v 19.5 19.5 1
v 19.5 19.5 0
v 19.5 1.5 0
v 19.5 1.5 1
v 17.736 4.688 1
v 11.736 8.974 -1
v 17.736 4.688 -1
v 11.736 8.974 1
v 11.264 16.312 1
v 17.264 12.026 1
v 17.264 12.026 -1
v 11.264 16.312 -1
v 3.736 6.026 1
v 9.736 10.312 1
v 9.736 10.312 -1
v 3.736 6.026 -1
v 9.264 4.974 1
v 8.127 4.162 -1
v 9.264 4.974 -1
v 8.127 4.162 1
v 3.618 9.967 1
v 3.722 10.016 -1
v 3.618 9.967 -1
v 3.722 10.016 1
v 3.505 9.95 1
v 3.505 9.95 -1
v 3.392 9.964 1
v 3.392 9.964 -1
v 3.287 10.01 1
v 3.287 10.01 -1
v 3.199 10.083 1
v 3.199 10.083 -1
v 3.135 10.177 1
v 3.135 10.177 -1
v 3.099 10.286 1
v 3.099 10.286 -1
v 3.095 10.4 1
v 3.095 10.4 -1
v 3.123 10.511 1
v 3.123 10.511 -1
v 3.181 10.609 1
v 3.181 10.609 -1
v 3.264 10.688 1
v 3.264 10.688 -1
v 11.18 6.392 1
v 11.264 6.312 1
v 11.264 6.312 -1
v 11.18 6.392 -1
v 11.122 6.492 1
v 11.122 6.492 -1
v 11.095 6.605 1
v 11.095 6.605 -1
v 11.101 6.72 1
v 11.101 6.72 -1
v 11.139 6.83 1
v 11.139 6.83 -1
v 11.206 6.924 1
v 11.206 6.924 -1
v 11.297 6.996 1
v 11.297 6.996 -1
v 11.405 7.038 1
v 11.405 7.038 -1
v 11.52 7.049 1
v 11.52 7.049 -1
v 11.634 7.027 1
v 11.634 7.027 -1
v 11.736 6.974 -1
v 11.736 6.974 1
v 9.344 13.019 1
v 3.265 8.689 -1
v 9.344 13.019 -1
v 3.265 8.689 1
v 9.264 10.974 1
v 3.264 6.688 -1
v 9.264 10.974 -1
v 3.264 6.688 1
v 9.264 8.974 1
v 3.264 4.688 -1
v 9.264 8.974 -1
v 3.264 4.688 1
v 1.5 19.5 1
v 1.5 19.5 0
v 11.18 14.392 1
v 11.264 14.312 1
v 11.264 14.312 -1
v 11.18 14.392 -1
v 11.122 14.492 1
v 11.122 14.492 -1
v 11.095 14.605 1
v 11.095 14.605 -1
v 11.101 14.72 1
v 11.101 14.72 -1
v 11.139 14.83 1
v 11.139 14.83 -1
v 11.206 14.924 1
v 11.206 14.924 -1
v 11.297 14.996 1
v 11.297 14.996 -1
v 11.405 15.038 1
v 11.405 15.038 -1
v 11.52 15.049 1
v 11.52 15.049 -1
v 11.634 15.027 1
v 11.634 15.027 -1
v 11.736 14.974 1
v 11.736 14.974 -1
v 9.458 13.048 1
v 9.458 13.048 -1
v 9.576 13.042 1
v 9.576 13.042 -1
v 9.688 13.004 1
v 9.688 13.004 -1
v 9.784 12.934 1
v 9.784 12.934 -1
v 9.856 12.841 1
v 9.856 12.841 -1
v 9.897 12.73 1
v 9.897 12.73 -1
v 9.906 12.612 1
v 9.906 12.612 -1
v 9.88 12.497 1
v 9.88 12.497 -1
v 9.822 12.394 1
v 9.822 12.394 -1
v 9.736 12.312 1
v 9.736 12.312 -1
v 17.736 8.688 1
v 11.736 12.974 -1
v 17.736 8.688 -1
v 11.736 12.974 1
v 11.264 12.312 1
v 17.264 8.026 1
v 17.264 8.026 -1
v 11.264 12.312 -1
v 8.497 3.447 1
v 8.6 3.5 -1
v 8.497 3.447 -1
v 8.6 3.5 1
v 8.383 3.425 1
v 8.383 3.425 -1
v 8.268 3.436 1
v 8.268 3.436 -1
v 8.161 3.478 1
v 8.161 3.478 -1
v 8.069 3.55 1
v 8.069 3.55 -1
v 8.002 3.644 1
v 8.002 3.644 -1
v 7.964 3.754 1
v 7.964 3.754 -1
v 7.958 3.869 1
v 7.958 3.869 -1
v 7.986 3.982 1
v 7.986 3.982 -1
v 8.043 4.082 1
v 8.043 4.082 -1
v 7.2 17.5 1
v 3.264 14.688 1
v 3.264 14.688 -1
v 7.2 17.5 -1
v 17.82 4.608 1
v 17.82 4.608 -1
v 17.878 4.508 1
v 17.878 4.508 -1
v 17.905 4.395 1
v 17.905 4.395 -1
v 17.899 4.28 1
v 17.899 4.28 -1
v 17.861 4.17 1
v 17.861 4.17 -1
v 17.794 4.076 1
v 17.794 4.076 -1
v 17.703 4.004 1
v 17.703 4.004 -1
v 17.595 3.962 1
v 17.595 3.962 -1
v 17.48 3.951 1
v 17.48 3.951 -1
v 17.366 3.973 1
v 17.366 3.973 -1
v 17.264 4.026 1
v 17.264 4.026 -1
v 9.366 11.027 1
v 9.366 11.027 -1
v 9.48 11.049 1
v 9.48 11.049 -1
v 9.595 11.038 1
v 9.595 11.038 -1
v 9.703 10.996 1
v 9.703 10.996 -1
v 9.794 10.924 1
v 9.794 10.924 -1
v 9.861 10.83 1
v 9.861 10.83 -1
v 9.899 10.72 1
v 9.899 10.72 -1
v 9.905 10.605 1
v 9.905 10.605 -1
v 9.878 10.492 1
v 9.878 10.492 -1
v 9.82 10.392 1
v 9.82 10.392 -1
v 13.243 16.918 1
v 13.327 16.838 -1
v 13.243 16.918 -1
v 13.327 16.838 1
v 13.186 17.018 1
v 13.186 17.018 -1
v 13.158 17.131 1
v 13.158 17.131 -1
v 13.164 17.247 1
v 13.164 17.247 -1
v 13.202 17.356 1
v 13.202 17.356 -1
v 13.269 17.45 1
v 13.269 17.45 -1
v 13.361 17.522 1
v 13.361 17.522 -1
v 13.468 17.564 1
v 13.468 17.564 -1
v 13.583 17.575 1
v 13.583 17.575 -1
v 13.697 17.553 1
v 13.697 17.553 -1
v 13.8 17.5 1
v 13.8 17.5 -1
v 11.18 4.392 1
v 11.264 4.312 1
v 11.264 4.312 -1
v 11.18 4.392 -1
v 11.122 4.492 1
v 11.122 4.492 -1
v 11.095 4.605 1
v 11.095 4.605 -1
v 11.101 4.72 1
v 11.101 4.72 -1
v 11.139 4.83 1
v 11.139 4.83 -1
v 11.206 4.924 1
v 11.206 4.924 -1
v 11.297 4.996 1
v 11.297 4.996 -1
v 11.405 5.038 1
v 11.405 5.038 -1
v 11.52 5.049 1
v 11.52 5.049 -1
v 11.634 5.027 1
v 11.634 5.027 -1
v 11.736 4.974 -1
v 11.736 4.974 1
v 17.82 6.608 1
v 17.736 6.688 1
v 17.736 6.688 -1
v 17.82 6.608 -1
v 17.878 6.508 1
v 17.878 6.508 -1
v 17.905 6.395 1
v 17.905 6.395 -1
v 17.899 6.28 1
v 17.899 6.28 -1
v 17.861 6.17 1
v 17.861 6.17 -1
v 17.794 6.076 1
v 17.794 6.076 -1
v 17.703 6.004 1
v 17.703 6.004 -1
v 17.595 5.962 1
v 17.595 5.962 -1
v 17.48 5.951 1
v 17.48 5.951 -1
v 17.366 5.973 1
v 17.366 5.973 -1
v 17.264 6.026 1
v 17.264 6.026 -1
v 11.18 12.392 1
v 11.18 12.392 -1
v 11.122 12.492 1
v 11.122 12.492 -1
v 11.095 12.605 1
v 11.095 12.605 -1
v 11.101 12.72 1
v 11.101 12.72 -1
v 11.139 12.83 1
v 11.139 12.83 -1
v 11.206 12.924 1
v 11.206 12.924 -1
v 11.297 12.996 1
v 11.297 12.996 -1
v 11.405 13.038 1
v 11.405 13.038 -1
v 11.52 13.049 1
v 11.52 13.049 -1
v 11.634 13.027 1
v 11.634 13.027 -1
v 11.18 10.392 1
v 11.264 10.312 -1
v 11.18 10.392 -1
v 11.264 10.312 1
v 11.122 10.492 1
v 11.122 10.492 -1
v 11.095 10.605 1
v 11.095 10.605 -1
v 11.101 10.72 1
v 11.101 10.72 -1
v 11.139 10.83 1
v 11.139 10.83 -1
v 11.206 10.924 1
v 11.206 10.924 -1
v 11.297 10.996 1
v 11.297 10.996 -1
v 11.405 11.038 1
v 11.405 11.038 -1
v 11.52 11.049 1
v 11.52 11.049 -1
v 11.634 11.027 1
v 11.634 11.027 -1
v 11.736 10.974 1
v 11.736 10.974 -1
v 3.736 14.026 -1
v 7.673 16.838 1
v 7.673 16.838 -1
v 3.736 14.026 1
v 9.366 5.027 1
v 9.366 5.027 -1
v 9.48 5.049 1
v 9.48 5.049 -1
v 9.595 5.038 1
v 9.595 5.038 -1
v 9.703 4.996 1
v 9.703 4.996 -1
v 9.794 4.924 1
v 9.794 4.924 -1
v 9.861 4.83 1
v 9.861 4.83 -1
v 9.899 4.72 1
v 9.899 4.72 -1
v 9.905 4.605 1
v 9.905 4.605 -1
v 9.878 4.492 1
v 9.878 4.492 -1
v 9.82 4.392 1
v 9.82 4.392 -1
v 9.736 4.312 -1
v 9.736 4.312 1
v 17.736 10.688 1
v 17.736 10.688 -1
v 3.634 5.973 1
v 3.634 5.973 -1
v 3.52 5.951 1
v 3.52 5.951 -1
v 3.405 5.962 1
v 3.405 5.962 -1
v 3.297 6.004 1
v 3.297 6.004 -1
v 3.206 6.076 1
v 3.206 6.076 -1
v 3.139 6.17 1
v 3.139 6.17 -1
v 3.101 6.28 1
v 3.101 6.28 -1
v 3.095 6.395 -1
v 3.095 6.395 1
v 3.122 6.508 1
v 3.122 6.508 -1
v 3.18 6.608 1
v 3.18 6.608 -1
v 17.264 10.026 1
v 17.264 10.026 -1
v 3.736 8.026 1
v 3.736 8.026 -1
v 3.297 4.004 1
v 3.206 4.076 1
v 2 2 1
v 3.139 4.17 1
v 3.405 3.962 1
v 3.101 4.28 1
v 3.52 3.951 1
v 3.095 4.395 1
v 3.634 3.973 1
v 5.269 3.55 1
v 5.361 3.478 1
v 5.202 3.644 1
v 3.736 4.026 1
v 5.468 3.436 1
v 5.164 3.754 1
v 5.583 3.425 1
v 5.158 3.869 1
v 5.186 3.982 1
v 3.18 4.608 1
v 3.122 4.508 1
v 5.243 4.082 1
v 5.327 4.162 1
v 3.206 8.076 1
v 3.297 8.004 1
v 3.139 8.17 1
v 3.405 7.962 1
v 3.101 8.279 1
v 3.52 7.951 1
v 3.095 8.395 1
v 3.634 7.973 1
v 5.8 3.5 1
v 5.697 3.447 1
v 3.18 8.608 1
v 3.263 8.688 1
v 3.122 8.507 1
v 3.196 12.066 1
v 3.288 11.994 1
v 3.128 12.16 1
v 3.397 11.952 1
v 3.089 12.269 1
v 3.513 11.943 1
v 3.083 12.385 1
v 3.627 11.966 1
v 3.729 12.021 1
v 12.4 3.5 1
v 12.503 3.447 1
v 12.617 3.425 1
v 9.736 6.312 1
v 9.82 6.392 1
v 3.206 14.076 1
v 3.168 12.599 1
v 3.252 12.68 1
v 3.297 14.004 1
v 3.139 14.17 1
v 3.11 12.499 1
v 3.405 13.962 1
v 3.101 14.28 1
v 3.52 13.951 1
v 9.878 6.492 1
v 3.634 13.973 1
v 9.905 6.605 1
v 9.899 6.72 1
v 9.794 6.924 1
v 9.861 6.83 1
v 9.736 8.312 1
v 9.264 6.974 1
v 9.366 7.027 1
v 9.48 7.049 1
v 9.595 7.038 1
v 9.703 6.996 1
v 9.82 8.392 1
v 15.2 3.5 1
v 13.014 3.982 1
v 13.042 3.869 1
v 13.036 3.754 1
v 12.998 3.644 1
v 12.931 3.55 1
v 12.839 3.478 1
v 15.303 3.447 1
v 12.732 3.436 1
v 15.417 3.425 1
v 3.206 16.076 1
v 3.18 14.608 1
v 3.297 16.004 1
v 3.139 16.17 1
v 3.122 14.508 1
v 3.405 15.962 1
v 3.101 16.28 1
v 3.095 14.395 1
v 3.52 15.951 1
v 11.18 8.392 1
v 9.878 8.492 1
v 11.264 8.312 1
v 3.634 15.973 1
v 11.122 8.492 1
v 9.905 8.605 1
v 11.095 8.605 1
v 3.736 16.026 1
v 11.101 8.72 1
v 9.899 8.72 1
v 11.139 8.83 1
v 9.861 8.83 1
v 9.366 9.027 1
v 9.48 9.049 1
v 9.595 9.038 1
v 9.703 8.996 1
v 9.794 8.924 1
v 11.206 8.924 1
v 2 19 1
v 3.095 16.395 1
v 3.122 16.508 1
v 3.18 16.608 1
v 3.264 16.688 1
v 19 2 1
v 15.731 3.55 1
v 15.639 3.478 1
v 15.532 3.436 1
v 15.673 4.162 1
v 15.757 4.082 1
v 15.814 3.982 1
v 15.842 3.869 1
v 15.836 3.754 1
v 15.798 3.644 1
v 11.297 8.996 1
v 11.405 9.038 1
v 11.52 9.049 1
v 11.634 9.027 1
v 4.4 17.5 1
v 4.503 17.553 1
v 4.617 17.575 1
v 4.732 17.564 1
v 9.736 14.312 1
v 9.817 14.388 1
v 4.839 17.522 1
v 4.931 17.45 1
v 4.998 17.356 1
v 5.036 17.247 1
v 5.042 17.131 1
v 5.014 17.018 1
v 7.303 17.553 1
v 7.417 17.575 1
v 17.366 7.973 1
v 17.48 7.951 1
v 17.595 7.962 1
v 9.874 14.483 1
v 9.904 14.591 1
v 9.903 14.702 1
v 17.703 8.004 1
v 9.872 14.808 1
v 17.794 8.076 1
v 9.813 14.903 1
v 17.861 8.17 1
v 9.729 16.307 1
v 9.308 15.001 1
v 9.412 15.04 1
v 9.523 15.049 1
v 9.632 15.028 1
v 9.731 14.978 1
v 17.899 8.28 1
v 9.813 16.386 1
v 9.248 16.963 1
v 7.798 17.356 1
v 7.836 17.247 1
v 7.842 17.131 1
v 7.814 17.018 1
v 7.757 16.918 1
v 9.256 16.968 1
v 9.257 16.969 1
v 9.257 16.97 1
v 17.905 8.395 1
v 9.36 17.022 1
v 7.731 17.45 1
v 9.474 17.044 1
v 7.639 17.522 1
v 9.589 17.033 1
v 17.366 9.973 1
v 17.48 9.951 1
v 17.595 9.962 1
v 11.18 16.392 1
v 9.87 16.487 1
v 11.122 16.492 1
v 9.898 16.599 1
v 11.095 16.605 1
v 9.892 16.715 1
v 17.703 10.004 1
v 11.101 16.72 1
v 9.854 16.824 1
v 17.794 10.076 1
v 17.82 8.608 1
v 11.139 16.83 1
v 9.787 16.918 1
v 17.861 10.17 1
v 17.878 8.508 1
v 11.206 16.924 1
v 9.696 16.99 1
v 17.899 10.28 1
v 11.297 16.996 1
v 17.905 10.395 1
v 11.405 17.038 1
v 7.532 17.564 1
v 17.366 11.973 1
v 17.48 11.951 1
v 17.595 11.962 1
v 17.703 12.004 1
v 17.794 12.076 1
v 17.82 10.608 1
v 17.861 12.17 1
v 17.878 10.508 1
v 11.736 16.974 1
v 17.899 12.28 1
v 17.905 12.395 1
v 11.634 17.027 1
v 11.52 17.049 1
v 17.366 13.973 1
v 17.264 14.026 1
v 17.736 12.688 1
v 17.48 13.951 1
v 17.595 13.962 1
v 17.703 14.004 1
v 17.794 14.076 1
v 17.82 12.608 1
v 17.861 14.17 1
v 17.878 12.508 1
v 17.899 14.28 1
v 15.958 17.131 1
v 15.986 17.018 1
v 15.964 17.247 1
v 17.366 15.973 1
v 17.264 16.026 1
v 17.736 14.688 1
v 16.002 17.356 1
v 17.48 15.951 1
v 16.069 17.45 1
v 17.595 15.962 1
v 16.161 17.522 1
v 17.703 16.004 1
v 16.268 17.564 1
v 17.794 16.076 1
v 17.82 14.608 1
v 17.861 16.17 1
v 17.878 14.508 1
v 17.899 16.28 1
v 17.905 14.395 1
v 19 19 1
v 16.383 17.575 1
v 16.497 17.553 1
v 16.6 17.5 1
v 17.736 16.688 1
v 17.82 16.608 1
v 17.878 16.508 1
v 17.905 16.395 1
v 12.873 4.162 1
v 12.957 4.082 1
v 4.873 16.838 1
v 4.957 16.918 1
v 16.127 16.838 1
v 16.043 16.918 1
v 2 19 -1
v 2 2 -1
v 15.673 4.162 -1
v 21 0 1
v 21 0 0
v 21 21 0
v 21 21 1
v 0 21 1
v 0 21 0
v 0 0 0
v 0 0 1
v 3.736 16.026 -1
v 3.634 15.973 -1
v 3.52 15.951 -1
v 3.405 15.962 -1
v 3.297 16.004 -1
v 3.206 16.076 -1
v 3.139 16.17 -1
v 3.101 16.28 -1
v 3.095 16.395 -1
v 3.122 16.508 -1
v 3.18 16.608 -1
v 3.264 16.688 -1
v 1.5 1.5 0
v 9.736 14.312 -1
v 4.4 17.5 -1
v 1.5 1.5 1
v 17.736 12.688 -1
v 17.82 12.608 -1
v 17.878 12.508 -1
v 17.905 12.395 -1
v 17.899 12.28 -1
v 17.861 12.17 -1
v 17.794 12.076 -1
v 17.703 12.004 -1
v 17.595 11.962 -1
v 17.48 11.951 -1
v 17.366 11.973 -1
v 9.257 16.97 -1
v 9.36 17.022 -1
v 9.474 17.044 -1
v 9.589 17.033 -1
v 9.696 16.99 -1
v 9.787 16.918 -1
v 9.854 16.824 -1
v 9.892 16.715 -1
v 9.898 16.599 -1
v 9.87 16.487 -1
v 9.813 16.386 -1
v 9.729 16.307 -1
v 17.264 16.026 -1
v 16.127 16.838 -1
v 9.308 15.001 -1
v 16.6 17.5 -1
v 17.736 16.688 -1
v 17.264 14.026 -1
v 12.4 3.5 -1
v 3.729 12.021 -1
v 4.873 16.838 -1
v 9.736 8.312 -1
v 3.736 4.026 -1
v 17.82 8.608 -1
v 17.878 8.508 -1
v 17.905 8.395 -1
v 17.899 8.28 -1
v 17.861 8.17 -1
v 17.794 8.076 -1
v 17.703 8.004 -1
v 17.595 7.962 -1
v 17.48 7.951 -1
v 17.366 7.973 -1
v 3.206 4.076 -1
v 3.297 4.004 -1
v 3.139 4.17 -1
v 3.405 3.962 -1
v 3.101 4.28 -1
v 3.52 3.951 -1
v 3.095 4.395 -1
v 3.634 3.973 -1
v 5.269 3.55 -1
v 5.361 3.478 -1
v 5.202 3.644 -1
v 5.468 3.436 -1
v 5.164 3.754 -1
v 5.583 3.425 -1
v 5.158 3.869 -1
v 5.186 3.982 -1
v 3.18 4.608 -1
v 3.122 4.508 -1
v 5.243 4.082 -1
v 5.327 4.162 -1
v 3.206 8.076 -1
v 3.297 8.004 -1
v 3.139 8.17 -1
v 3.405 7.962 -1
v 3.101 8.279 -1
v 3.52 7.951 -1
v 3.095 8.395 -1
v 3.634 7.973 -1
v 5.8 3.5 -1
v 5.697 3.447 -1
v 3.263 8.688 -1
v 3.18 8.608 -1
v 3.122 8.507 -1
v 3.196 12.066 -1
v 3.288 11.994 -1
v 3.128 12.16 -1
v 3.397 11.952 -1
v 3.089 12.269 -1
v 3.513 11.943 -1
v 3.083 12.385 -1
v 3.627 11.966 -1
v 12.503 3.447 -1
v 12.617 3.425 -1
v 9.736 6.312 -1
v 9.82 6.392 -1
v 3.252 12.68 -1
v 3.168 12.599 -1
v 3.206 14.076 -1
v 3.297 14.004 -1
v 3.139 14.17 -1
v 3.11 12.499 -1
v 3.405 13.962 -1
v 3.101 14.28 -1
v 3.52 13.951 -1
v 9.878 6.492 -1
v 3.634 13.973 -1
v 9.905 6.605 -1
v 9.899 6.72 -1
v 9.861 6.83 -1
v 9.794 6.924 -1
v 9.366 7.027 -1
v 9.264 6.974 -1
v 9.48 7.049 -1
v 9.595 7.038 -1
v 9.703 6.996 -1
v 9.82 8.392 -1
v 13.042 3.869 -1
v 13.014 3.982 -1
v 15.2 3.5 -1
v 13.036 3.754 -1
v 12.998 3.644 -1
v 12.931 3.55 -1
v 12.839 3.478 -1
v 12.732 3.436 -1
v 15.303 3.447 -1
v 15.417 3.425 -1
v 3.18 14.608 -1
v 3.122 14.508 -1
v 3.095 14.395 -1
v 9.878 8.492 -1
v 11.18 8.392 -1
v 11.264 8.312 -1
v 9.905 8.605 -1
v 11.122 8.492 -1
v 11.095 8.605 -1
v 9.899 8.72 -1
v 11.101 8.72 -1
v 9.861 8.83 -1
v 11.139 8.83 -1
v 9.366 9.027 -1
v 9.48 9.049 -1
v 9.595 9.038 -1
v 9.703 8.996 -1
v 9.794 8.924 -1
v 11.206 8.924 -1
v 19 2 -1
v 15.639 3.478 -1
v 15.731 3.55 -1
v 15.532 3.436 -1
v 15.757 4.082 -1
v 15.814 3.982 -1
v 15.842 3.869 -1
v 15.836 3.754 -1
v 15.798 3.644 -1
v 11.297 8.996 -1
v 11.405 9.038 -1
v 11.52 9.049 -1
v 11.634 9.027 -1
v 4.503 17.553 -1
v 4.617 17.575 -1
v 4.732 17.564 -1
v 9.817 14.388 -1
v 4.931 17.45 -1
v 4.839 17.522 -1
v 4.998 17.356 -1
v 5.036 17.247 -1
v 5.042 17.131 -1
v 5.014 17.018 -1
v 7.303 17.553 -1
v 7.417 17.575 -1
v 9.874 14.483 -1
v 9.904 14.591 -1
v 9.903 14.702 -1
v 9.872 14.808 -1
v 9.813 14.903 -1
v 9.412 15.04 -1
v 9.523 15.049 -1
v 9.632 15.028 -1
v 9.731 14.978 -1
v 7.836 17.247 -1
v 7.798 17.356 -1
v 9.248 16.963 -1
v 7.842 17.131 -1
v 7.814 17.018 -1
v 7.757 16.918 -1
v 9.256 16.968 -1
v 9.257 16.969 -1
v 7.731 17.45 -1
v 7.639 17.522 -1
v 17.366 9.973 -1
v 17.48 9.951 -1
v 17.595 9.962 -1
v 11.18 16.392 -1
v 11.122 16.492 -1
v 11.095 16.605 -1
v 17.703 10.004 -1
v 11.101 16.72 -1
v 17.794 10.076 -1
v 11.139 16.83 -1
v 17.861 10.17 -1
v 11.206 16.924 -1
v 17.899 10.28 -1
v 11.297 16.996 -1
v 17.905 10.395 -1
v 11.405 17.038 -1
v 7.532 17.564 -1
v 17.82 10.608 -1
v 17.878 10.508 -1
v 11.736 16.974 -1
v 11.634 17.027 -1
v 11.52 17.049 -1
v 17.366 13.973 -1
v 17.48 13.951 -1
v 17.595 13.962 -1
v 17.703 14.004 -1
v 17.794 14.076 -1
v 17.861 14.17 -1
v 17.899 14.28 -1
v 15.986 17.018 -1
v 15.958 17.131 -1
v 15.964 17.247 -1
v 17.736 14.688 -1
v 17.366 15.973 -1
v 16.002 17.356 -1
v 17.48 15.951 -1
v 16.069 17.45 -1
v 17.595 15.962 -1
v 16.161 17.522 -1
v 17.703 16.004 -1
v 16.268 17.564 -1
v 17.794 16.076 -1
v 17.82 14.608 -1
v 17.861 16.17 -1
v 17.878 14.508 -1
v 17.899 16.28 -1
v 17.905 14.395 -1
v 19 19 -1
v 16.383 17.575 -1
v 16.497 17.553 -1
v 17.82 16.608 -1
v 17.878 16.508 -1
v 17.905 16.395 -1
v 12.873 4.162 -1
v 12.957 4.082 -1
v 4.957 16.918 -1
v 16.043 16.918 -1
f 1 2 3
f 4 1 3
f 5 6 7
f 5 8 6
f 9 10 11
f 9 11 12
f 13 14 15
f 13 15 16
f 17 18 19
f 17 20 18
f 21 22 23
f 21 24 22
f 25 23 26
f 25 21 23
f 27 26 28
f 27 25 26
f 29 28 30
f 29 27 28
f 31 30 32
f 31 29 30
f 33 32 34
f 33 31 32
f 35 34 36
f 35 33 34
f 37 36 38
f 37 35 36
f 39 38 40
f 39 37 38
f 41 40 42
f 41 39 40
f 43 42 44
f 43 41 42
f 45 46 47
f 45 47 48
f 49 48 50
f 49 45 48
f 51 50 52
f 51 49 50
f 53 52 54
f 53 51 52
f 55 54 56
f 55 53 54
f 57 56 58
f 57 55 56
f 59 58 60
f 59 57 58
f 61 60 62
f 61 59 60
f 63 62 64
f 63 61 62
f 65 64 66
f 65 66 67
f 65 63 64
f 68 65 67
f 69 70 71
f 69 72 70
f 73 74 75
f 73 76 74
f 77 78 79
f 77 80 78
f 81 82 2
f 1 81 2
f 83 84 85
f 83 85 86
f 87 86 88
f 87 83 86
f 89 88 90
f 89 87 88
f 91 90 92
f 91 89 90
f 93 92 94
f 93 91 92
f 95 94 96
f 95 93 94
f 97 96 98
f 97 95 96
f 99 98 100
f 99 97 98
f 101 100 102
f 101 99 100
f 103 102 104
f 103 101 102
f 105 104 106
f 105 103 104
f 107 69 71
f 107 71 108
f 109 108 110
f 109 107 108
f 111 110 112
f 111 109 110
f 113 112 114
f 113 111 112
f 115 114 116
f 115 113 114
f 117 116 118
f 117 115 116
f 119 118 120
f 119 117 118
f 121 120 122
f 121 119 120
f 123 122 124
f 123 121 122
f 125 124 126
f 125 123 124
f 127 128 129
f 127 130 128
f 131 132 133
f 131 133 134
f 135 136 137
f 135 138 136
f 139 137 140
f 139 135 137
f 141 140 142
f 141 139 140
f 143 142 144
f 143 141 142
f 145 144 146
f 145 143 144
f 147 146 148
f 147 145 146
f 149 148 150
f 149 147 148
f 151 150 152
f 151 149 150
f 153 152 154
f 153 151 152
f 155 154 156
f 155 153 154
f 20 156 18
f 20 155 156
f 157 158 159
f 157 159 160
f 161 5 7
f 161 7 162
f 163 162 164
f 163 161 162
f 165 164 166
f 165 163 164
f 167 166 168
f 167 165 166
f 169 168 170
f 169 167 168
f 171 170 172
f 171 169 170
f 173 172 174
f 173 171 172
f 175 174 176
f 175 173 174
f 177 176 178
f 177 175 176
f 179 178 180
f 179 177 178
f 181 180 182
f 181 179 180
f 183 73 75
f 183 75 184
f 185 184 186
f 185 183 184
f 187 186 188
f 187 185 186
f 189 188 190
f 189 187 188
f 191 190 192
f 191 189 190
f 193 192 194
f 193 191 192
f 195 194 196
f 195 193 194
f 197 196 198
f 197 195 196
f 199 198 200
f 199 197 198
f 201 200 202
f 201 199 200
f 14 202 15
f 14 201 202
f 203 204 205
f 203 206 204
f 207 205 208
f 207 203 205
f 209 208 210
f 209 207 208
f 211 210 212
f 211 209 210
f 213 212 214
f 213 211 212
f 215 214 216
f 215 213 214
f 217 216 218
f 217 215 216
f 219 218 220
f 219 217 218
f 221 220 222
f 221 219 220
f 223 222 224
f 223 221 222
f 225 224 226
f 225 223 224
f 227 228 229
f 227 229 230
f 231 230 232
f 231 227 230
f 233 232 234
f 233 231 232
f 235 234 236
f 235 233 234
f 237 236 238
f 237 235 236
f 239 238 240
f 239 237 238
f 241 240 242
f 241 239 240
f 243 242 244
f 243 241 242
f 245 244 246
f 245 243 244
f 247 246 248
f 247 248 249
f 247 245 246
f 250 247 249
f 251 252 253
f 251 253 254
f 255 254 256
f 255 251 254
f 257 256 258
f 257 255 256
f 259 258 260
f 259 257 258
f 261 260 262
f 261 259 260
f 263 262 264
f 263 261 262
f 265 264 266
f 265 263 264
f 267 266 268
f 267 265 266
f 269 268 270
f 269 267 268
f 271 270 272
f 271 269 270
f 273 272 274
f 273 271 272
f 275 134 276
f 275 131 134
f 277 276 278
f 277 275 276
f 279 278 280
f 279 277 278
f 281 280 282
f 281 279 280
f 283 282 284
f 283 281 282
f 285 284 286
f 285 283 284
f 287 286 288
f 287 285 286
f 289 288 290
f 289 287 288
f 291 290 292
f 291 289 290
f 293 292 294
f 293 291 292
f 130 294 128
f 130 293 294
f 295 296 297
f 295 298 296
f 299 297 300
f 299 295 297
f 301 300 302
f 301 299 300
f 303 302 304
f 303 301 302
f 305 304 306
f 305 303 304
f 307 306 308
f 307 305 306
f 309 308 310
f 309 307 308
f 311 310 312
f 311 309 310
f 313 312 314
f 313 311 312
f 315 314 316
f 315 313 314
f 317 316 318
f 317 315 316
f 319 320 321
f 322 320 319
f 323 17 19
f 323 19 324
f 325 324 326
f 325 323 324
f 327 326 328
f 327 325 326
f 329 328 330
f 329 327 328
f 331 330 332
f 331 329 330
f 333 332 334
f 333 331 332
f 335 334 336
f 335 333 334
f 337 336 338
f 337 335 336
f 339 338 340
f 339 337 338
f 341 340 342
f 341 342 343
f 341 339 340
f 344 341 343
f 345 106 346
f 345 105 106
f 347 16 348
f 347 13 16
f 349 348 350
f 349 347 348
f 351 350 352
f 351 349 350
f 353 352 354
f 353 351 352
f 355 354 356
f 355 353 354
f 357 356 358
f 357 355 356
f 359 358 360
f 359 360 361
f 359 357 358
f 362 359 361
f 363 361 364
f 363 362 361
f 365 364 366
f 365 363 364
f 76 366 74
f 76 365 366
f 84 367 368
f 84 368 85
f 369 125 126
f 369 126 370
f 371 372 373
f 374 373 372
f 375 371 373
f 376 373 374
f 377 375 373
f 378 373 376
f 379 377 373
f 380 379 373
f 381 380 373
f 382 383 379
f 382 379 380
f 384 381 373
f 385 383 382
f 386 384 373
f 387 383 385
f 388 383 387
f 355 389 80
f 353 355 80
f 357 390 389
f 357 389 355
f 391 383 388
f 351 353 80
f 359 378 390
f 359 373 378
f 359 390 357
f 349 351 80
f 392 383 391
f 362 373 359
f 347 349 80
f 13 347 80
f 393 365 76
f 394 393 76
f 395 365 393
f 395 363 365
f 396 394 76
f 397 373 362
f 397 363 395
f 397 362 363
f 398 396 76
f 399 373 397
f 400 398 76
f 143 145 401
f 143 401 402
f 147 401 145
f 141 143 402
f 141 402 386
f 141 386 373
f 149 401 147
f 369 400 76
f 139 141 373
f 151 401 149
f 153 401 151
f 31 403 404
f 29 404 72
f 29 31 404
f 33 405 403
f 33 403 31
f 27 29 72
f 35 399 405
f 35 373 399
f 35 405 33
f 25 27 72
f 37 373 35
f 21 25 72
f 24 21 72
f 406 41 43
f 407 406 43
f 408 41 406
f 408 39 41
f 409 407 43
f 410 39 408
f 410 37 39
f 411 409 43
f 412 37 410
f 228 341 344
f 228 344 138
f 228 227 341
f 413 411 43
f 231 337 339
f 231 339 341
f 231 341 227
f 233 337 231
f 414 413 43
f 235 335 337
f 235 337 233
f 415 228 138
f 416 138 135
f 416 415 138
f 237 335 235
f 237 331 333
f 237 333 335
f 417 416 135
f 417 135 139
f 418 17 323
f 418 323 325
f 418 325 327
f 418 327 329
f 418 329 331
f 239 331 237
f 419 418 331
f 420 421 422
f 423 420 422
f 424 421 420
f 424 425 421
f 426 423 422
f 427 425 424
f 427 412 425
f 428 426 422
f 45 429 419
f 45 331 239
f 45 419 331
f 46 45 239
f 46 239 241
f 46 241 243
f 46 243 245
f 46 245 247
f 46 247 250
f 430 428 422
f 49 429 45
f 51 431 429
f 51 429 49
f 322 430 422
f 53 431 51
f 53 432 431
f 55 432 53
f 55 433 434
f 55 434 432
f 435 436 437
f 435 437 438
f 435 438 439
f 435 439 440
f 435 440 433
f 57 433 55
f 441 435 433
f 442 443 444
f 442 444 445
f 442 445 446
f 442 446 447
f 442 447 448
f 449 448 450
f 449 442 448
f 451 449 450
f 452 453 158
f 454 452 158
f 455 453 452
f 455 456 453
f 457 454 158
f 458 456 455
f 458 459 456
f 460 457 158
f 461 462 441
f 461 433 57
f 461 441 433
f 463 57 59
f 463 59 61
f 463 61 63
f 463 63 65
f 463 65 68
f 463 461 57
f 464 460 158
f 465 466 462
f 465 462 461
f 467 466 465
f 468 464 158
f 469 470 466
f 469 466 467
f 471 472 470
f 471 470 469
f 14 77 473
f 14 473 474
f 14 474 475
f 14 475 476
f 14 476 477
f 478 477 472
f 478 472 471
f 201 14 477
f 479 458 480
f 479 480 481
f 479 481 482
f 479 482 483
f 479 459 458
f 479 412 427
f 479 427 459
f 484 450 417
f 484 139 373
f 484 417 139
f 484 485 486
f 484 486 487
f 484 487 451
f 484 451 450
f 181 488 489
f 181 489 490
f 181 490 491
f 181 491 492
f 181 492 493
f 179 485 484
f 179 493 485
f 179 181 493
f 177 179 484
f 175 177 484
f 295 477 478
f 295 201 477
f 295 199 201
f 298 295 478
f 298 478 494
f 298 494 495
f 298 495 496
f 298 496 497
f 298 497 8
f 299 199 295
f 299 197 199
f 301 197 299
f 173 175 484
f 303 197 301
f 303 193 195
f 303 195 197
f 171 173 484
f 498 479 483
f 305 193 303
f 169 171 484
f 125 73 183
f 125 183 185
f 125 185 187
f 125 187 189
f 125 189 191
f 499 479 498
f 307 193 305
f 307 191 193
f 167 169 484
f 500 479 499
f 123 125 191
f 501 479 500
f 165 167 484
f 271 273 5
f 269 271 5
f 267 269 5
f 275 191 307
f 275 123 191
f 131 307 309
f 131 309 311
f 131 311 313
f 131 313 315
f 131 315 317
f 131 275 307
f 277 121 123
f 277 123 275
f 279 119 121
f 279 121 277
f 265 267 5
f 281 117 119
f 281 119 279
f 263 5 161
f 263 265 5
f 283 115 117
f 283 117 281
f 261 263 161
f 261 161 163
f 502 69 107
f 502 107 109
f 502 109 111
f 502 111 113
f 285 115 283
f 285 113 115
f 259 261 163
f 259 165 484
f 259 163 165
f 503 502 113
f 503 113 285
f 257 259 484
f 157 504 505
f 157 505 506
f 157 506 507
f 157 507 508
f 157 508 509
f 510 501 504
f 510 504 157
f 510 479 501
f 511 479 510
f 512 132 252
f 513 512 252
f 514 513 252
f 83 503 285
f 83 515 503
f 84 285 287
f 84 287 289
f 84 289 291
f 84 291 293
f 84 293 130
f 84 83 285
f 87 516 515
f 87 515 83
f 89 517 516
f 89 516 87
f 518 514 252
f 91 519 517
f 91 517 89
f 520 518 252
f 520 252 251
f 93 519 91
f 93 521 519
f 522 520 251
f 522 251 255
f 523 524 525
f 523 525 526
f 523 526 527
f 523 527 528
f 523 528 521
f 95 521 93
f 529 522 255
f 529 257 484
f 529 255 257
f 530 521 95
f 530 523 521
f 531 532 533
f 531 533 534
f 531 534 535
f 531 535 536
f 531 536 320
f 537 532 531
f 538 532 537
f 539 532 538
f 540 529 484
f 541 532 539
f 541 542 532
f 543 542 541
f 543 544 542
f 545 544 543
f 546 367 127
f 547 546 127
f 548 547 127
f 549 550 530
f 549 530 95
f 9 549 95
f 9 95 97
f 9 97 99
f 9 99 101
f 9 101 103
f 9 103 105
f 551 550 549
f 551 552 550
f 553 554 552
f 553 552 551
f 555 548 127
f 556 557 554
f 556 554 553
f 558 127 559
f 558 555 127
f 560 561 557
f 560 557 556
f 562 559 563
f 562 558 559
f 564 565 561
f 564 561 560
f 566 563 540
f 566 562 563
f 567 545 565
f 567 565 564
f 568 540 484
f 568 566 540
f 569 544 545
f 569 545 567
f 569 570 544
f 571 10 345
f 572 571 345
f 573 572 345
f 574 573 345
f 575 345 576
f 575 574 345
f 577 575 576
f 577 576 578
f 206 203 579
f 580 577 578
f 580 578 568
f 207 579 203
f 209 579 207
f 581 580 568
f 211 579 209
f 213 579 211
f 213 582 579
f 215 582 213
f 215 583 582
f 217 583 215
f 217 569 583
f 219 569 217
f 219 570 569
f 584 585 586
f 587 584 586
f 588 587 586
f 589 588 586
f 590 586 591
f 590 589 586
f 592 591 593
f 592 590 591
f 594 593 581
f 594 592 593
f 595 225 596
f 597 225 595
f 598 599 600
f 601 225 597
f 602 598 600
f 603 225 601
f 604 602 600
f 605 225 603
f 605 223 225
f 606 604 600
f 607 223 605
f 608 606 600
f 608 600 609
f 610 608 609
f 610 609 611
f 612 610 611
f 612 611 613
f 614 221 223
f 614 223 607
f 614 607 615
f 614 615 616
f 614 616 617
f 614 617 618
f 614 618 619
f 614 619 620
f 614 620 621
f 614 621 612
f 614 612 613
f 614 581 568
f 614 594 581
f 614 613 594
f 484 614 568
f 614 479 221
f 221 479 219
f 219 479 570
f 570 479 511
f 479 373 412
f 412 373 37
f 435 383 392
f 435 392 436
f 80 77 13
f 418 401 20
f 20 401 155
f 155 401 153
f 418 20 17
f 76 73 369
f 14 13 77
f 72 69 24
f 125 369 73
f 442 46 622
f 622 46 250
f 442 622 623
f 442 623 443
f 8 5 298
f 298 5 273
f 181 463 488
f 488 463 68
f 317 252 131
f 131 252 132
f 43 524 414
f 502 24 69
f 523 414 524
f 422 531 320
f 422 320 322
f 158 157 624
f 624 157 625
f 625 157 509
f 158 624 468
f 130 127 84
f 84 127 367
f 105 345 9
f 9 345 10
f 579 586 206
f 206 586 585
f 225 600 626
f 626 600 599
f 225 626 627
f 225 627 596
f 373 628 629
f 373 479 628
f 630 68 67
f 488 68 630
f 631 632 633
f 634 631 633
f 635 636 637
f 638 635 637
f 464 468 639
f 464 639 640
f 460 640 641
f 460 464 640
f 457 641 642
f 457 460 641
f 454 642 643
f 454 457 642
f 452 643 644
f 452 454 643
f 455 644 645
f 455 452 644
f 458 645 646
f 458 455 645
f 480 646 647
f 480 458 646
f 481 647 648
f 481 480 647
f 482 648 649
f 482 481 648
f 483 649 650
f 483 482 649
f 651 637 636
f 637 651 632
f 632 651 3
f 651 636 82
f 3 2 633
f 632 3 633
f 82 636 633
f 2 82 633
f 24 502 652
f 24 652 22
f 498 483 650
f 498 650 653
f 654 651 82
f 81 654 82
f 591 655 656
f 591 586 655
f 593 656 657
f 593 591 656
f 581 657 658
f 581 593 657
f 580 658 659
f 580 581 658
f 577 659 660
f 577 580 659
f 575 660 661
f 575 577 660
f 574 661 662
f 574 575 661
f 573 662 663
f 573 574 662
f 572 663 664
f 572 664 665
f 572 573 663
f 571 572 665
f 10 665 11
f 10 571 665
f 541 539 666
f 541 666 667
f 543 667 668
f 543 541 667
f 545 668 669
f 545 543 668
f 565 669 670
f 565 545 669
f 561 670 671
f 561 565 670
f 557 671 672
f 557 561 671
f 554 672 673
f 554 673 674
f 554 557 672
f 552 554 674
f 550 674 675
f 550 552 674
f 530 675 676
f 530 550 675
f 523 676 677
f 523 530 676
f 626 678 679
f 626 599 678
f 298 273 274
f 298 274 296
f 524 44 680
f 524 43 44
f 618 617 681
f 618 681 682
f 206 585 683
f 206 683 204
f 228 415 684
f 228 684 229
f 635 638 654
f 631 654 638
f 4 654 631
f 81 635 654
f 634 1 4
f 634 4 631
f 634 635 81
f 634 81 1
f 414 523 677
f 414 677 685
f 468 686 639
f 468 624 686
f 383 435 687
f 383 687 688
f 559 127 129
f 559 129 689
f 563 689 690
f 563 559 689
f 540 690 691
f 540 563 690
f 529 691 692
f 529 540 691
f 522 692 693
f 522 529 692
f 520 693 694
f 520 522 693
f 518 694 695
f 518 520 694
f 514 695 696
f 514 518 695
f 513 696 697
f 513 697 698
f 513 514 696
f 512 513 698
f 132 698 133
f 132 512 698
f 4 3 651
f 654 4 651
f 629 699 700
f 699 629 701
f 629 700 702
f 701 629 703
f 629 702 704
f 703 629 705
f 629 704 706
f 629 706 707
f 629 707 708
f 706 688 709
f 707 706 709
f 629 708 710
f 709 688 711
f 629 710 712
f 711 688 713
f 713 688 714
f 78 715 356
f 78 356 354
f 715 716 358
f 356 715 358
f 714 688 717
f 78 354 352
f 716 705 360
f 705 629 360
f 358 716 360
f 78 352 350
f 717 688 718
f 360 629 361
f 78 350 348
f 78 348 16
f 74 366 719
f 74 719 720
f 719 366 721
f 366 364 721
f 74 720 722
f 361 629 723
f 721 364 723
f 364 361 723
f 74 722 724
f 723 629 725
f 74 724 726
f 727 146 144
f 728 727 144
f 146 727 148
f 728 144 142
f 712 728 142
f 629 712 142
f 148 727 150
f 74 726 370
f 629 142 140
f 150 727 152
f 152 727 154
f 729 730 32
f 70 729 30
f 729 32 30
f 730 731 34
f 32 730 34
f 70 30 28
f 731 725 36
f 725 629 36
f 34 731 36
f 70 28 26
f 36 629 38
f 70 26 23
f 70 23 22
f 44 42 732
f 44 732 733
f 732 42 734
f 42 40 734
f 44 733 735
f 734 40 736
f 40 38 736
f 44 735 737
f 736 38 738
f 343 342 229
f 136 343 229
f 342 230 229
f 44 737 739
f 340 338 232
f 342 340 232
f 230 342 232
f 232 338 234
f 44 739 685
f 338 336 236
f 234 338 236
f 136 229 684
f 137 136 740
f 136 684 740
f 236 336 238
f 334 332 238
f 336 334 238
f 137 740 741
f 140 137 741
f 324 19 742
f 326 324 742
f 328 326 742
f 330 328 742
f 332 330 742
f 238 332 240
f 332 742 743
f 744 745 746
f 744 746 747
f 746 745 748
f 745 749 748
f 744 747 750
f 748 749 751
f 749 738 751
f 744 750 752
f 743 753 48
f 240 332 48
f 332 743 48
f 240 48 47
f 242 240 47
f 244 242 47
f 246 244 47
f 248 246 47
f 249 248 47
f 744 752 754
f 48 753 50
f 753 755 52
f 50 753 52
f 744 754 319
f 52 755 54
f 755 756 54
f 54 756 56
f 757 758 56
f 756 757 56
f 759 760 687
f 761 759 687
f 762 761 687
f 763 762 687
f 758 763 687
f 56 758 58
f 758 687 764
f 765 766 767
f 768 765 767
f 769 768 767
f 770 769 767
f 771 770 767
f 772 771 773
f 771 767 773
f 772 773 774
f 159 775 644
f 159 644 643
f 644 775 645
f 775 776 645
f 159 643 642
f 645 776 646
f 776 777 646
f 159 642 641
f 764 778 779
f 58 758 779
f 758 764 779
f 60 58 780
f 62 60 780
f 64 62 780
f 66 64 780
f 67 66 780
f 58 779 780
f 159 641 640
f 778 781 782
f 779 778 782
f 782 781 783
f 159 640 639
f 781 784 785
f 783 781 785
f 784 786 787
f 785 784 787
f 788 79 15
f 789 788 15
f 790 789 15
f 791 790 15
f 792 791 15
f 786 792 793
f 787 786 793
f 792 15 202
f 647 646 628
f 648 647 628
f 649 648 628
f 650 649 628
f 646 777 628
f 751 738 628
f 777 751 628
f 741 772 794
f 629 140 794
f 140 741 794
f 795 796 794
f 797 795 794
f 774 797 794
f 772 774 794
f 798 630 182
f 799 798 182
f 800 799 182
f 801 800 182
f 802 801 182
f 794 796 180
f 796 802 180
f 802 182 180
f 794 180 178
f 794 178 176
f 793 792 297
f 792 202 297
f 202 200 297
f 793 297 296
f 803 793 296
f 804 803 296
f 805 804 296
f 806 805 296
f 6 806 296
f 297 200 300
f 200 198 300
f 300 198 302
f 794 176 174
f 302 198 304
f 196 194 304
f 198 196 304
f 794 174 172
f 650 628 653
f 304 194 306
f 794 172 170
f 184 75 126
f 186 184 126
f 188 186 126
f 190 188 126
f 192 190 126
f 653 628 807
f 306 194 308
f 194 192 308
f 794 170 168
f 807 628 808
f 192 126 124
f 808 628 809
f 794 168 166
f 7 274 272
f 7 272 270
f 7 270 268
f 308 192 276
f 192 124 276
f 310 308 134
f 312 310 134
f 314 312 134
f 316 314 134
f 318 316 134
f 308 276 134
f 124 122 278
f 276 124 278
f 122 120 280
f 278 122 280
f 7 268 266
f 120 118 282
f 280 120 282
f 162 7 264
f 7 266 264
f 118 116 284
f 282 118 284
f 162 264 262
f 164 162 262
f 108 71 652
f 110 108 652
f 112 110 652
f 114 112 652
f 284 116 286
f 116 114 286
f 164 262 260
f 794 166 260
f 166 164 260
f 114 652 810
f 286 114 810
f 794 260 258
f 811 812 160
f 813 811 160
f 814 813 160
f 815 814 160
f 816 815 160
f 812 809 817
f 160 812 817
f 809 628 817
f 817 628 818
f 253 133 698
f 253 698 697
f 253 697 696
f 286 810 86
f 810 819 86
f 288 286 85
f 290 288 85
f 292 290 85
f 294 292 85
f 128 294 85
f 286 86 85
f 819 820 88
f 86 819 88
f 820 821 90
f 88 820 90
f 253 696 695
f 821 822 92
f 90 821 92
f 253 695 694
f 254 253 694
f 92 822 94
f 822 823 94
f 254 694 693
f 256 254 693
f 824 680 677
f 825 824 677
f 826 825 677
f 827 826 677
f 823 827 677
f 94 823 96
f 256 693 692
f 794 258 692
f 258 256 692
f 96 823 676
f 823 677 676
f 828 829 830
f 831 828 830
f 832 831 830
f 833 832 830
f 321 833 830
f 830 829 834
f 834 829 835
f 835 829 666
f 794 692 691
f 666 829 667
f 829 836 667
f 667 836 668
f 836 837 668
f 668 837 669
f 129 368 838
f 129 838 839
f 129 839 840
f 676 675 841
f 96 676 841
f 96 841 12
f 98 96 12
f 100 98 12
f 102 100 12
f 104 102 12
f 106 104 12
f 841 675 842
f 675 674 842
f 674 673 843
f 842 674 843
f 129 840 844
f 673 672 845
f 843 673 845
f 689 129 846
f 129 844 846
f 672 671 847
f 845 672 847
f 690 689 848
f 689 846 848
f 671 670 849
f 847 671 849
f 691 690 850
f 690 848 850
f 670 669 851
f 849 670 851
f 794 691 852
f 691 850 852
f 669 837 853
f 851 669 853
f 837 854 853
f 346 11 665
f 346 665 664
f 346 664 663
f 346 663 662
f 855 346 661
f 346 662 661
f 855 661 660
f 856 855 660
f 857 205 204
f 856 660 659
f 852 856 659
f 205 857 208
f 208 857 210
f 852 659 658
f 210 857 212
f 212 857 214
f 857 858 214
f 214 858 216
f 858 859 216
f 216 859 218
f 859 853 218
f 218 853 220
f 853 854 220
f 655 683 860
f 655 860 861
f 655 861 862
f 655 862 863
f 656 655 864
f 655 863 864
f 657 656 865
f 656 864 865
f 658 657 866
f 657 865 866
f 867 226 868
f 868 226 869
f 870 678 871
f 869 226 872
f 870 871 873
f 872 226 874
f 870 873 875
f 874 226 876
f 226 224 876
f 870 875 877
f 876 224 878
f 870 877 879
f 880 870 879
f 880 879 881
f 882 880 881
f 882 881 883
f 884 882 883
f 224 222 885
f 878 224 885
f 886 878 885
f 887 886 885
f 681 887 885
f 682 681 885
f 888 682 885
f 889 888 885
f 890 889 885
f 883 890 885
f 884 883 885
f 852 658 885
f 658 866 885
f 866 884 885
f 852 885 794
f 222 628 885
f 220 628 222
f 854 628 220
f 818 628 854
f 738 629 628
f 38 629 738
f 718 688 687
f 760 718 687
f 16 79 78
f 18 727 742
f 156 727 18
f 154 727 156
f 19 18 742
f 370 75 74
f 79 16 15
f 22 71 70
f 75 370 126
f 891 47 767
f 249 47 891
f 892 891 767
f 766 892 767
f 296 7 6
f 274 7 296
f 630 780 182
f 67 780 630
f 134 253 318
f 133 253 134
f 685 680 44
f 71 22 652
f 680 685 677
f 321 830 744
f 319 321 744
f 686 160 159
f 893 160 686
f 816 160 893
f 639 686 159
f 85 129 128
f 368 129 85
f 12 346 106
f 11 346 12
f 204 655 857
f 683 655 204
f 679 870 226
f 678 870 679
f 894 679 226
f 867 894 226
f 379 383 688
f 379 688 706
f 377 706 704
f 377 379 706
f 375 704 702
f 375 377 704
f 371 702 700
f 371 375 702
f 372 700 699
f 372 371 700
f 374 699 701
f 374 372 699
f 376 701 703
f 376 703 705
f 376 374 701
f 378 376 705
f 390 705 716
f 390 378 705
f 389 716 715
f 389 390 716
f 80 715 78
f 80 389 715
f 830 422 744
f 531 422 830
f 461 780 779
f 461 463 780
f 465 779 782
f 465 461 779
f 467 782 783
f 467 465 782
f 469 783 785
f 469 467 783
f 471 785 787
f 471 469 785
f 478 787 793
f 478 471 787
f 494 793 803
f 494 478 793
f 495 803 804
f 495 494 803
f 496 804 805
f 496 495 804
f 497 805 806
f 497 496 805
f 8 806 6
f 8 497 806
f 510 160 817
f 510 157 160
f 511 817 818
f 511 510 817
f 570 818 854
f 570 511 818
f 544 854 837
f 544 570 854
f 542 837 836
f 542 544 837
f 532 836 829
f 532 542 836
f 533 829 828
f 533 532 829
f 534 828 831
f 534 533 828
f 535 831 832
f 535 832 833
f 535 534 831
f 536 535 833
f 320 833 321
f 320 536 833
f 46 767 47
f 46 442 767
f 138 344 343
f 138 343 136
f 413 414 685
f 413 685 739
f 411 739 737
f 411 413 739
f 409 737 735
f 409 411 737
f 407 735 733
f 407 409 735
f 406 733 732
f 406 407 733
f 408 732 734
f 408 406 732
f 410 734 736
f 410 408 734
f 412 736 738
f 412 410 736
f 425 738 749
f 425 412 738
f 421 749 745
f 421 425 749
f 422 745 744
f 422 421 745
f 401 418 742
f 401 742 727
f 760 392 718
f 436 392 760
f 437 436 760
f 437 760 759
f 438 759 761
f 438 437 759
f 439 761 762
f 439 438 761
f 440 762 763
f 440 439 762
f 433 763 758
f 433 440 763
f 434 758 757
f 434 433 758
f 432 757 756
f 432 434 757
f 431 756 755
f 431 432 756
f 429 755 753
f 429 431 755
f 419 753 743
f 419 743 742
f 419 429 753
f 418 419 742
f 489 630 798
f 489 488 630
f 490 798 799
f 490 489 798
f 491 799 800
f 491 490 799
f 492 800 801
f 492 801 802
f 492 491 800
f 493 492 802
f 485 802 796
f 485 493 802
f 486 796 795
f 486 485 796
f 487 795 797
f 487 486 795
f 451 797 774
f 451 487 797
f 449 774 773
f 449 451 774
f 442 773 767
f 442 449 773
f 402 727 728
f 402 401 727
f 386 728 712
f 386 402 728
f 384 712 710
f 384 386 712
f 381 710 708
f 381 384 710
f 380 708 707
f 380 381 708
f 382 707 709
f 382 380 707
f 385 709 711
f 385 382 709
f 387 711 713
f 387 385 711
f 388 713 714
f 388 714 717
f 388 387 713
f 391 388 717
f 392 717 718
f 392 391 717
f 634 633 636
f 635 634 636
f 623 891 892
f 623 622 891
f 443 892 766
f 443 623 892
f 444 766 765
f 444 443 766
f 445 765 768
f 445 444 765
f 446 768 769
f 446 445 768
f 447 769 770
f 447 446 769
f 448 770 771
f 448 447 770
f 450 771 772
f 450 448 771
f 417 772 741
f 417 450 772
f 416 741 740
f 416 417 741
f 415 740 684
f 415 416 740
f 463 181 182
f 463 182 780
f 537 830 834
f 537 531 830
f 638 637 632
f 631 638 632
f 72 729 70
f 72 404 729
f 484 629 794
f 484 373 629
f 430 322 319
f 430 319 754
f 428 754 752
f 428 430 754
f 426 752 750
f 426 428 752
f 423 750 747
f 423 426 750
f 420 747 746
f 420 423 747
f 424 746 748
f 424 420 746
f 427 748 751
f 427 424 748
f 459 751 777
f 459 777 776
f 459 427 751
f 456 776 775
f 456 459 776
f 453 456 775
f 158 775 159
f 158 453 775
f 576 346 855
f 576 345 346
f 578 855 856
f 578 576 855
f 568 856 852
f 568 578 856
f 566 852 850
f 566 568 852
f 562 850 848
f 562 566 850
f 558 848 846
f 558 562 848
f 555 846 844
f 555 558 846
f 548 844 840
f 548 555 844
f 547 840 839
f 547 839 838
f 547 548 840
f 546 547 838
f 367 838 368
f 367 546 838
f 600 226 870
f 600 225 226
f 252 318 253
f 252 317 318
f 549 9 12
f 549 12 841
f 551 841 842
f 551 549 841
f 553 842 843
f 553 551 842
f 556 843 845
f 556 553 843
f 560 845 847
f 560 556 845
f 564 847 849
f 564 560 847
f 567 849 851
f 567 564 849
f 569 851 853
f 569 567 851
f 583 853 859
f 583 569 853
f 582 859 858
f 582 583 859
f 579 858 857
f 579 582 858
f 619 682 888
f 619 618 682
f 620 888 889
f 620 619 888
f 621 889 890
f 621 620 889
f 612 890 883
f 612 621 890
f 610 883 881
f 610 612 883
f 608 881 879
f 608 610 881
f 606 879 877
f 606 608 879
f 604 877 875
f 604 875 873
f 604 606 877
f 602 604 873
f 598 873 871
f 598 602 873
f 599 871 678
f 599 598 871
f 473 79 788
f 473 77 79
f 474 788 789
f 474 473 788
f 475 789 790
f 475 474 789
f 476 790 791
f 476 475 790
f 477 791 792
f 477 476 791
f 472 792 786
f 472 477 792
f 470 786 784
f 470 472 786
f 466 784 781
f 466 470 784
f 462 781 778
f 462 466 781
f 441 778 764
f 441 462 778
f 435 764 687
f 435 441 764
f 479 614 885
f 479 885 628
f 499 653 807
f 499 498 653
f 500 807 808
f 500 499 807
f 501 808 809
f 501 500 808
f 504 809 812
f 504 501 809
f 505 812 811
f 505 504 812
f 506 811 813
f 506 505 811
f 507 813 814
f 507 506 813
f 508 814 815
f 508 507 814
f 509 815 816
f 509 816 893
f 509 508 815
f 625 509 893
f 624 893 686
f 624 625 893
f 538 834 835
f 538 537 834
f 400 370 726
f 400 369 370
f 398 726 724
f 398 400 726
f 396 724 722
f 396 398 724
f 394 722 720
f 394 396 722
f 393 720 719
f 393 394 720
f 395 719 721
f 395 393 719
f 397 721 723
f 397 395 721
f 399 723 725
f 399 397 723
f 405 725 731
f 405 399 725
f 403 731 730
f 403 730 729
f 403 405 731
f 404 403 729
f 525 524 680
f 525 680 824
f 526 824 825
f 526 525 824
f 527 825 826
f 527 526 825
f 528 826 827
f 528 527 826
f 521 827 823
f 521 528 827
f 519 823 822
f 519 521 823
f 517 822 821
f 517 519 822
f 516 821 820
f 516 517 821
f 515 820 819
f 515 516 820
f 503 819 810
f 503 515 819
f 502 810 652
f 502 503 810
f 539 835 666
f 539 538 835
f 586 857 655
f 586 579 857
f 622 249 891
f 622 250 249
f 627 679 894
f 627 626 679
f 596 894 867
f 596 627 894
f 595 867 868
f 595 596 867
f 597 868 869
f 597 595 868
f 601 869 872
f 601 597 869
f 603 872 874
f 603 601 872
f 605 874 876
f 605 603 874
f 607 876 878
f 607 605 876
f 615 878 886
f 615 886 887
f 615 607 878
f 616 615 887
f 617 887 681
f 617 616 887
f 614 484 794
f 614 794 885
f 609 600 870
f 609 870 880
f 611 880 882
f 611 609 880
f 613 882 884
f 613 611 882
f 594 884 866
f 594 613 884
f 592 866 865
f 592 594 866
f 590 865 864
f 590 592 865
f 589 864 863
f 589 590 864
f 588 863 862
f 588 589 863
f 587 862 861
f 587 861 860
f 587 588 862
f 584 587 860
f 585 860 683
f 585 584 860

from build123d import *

# Parameters (mm, degrees)
F1_DEPTH = 1
F2_DEPTH = 1


with BuildPart() as f1:
    # F0 (on Top) → F1 (new body)
    with BuildSketch(Plane.XY):
        Polygon((2, 3.5), (2, 2), (3, 2), (3.5, 2), (11, 2), (11.5, 2), (17.5, 2), (19, 2), (19, 19), (2, 19), align=None)
        with BuildLine():
            ThreePointArc((9.2635135135, 6.9739456513), (9.8310810811, 6.8793510567), (9.7364864865, 6.3117834892))
            Line((9.7364864865, 6.3117834892), (5.8, 3.5000074274))
            ThreePointArc((5.8, 3.5000074274), (5.2324324324, 3.594602022), (5.327027027, 4.1621695896))
            Line((5.327027027, 4.1621695896), (9.2635135135, 6.9739456513))
        make_face(mode=Mode.SUBTRACT)
        with BuildLine():
            ThreePointArc((9.2635135135, 4.9739456513), (9.8310810811, 4.8793510567), (9.7364864865, 4.3117834892))
            Line((9.7364864865, 4.3117834892), (8.6, 3.5000074274))
            ThreePointArc((8.6, 3.5000074274), (8.0324324324, 3.594602022), (8.127027027, 4.1621695896))
            Line((8.127027027, 4.1621695896), (9.2635135135, 4.9739456513))
        make_face(mode=Mode.SUBTRACT)
        with BuildLine():
            Line((9.7364864865, 8.3117834892), (3.7364864865, 4.0260692035))
            ThreePointArc((3.7364864865, 4.0260692035), (3.1689189189, 4.1206637981), (3.2635135135, 4.6882313656))
            Line((3.2635135135, 4.6882313656), (9.2635135135, 8.9739456513))
            ThreePointArc((9.2635135135, 8.9739456513), (9.8310810811, 8.8793510567), (9.7364864865, 8.3117834892))
        make_face(mode=Mode.SUBTRACT)
        with BuildLine():
            ThreePointArc((9.2635135135, 10.9739456513), (9.8310810811, 10.8793510567), (9.7364864865, 10.3117834892))
            Line((9.7364864865, 10.3117834892), (3.7364864865, 6.0260692035))
            ThreePointArc((3.7364864865, 6.0260692035), (3.1689189189, 6.1206637981), (3.2635135135, 6.6882313656))
            Line((3.2635135135, 6.6882313656), (9.2635135135, 10.9739456513))
        make_face(mode=Mode.SUBTRACT)
        with BuildLine():
            ThreePointArc((9.3436971033, 13.0185108947), (9.8556308423, 12.8405196013), (9.7364866156, 12.3117836493))
            Line((9.7364866156, 12.3117836493), (3.7364220661, 8.0260248025))
            ThreePointArc((3.7364220661, 8.0260248025), (3.169093087, 8.1204746996), (3.263338585, 8.6878376696))
            Line((3.263338585, 8.6878376696), (3.2647144726, 8.6888176315))
            Line((3.2647144726, 8.6888176315), (9.3436971033, 13.0185108947))
        make_face(mode=Mode.SUBTRACT)
        with BuildLine():
            Line((12.4, 3.5000074274), (11.2635135135, 4.3117834892))
            ThreePointArc((11.2635135135, 4.3117834892), (11.1689189189, 4.8793510567), (11.7364864865, 4.9739456513))
            Line((11.7364864865, 4.9739456513), (12.872972973, 4.1621695896))
            ThreePointArc((12.872972973, 4.1621695896), (12.9675675676, 3.594602022), (12.4, 3.5000074274))
        make_face(mode=Mode.SUBTRACT)
        with BuildLine():
            ThreePointArc((11.2635135135, 6.3117834892), (11.1689189189, 6.8793510567), (11.7364864865, 6.9739456513))
            Line((11.7364864865, 6.9739456513), (15.672972973, 4.1621695896))
            ThreePointArc((15.672972973, 4.1621695896), (15.7675675676, 3.594602022), (15.2, 3.5000074274))
            Line((15.2, 3.5000074274), (11.2635135135, 6.3117834892))
        make_face(mode=Mode.SUBTRACT)
        with BuildLine():
            ThreePointArc((17.7364864865, 4.6882313656), (17.8310810811, 4.1206637981), (17.2635135135, 4.0260692035))
            Line((17.2635135135, 4.0260692035), (11.2635135135, 8.3117834892))
            ThreePointArc((11.2635135135, 8.3117834892), (11.1689189189, 8.8793510567), (11.7364864865, 8.9739456513))
            Line((11.7364864865, 8.9739456513), (17.7364864865, 4.6882313656))
        make_face(mode=Mode.SUBTRACT)
        with BuildLine():
            ThreePointArc((17.7364864865, 6.6882313656), (17.8310810811, 6.1206637981), (17.2635135135, 6.0260692035))
            Line((17.2635135135, 6.0260692035), (11.2635135135, 10.3117834892))
            ThreePointArc((11.2635135135, 10.3117834892), (11.1689189189, 10.8793510567), (11.7364864865, 10.9739456513))
            Line((11.7364864865, 10.9739456513), (17.7364864865, 6.6882313656))
        make_face(mode=Mode.SUBTRACT)
        with BuildLine():
            ThreePointArc((9.3077662905, 15.0014482863), (9.845544905, 14.8576589276), (9.7364863481, 14.3117766609))
            Line((9.7364863481, 14.3117766609), (3.7218457879, 10.0156108405))
            ThreePointArc((3.7218457879, 10.0156108405), (3.1636716169, 10.127639869), (3.2635835281, 10.6881097775))
            Line((3.2635835281, 10.6881097775), (9.3077662905, 15.0014482863))
        make_face(mode=Mode.SUBTRACT)
        with BuildLine():
            ThreePointArc((9.2573834813, 16.9695644641), (9.8241540054, 16.8734642955), (9.7291143701, 16.3065149706))
            Line((9.7291143701, 16.3065149706), (3.7291139187, 12.0208456607))
            ThreePointArc((3.7291139187, 12.0208456607), (3.1587960485, 12.1101706211), (3.2518404943, 12.6798934948))
            Line((3.2518404943, 12.6798934948), (9.2482660176, 16.9630545828))
            Line((9.2482660176, 16.9630545828), (9.2555077667, 16.9682272608))
            Line((9.2555077667, 16.9682272608), (9.2567757637, 16.9691329729))
            ThreePointArc((9.2567757637, 16.9691329729), (9.2570795237, 16.9693488576), (9.2573834813, 16.9695644641))
        make_face(mode=Mode.SUBTRACT)
        with BuildLine():
            ThreePointArc((3.7364864865, 16.0260692035), (3.1689189189, 16.1206637981), (3.2635135135, 16.6882313656))
            Line((3.2635135135, 16.6882313656), (4.4, 17.5000074274))
            ThreePointArc((4.4, 17.5000074274), (4.9675675676, 17.4054128328), (4.872972973, 16.8378452652))
            Line((4.872972973, 16.8378452652), (3.7364864865, 16.0260692035))
        make_face(mode=Mode.SUBTRACT)
        with BuildLine():
            ThreePointArc((3.7364864865, 14.0260692035), (3.1689189189, 14.1206637981), (3.2635135135, 14.6882313656))
            Line((3.2635135135, 14.6882313656), (7.2, 17.5000074274))
            ThreePointArc((7.2, 17.5000074274), (7.7675675676, 17.4054128328), (7.672972973, 16.8378452652))
            Line((7.672972973, 16.8378452652), (3.7364864865, 14.0260692035))
        make_face(mode=Mode.SUBTRACT)
        with BuildLine():
            ThreePointArc((17.7364864865, 8.6882313656), (17.8310810811, 8.1206637981), (17.2635135135, 8.0260692035))
            Line((17.2635135135, 8.0260692035), (11.2635135135, 12.3117834892))
            ThreePointArc((11.2635135135, 12.3117834892), (11.1689189189, 12.8793510567), (11.7364864865, 12.9739456513))
            Line((11.7364864865, 12.9739456513), (17.7364864865, 8.6882313656))
        make_face(mode=Mode.SUBTRACT)
        with BuildLine():
            Line((17.2635135135, 10.0260692035), (11.2635135135, 14.3117834892))
            ThreePointArc((11.2635135135, 14.3117834892), (11.1689189189, 14.8793510567), (11.7364864865, 14.9739456513))
            Line((11.7364864865, 14.9739456513), (17.7364864865, 10.6882313656))
            ThreePointArc((17.7364864865, 10.6882313656), (17.8310810811, 10.1206637981), (17.2635135135, 10.0260692035))
        make_face(mode=Mode.SUBTRACT)
        with BuildLine():
            Line((17.2635135135, 12.0260692035), (11.2635135135, 16.3117834892))
            ThreePointArc((11.2635135135, 16.3117834892), (11.1689189189, 16.8793510567), (11.7364864865, 16.9739456513))
            Line((11.7364864865, 16.9739456513), (17.7364864865, 12.6882313656))
            ThreePointArc((17.7364864865, 12.6882313656), (17.8310810811, 12.1206637981), (17.2635135135, 12.0260692035))
        make_face(mode=Mode.SUBTRACT)
        with BuildLine():
            ThreePointArc((17.7364864865, 14.6882313656), (17.8310810811, 14.1206637981), (17.2635135135, 14.0260692035))
            Line((17.2635135135, 14.0260692035), (13.327027027, 16.8378452652))
            ThreePointArc((13.327027027, 16.8378452652), (13.2324324324, 17.4054128328), (13.8, 17.5000074274))
            Line((13.8, 17.5000074274), (17.7364864865, 14.6882313656))
        make_face(mode=Mode.SUBTRACT)
        with BuildLine():
            Line((16.6, 17.5000074274), (17.7364864865, 16.6882313656))
            ThreePointArc((17.7364864865, 16.6882313656), (17.8310810811, 16.1206637981), (17.2635135135, 16.0260692035))
            Line((17.2635135135, 16.0260692035), (16.127027027, 16.8378452652))
            ThreePointArc((16.127027027, 16.8378452652), (16.0324324324, 17.4054128328), (16.6, 17.5000074274))
        make_face(mode=Mode.SUBTRACT)
    extrude(amount=F1_DEPTH)

    # F2 (add): a face of the model
    f2_faces = [f1.faces().sort_by_distance(p)[0] for p in [
        (10.4995544489, 10.500531174, 0),
    ]]
    extrude(f2_faces, amount=F2_DEPTH)


with BuildPart() as f1b:
    # F0 (on Top) → F1, piece 2 (new body)
    with BuildSketch(Plane.XY):
        Polygon((0, 1.5), (0, 0), (1.5, 0), (21, 0), (21, 21), (0, 21), align=None)
        Polygon((2, 1.5), (1.5, 1.5), (1.5, 2), (1.5, 19.5), (19.5, 19.5), (19.5, 1.5), align=None, mode=Mode.SUBTRACT)
    extrude(amount=F1_DEPTH)


solid = Compound([f1.part, f1b.part])
